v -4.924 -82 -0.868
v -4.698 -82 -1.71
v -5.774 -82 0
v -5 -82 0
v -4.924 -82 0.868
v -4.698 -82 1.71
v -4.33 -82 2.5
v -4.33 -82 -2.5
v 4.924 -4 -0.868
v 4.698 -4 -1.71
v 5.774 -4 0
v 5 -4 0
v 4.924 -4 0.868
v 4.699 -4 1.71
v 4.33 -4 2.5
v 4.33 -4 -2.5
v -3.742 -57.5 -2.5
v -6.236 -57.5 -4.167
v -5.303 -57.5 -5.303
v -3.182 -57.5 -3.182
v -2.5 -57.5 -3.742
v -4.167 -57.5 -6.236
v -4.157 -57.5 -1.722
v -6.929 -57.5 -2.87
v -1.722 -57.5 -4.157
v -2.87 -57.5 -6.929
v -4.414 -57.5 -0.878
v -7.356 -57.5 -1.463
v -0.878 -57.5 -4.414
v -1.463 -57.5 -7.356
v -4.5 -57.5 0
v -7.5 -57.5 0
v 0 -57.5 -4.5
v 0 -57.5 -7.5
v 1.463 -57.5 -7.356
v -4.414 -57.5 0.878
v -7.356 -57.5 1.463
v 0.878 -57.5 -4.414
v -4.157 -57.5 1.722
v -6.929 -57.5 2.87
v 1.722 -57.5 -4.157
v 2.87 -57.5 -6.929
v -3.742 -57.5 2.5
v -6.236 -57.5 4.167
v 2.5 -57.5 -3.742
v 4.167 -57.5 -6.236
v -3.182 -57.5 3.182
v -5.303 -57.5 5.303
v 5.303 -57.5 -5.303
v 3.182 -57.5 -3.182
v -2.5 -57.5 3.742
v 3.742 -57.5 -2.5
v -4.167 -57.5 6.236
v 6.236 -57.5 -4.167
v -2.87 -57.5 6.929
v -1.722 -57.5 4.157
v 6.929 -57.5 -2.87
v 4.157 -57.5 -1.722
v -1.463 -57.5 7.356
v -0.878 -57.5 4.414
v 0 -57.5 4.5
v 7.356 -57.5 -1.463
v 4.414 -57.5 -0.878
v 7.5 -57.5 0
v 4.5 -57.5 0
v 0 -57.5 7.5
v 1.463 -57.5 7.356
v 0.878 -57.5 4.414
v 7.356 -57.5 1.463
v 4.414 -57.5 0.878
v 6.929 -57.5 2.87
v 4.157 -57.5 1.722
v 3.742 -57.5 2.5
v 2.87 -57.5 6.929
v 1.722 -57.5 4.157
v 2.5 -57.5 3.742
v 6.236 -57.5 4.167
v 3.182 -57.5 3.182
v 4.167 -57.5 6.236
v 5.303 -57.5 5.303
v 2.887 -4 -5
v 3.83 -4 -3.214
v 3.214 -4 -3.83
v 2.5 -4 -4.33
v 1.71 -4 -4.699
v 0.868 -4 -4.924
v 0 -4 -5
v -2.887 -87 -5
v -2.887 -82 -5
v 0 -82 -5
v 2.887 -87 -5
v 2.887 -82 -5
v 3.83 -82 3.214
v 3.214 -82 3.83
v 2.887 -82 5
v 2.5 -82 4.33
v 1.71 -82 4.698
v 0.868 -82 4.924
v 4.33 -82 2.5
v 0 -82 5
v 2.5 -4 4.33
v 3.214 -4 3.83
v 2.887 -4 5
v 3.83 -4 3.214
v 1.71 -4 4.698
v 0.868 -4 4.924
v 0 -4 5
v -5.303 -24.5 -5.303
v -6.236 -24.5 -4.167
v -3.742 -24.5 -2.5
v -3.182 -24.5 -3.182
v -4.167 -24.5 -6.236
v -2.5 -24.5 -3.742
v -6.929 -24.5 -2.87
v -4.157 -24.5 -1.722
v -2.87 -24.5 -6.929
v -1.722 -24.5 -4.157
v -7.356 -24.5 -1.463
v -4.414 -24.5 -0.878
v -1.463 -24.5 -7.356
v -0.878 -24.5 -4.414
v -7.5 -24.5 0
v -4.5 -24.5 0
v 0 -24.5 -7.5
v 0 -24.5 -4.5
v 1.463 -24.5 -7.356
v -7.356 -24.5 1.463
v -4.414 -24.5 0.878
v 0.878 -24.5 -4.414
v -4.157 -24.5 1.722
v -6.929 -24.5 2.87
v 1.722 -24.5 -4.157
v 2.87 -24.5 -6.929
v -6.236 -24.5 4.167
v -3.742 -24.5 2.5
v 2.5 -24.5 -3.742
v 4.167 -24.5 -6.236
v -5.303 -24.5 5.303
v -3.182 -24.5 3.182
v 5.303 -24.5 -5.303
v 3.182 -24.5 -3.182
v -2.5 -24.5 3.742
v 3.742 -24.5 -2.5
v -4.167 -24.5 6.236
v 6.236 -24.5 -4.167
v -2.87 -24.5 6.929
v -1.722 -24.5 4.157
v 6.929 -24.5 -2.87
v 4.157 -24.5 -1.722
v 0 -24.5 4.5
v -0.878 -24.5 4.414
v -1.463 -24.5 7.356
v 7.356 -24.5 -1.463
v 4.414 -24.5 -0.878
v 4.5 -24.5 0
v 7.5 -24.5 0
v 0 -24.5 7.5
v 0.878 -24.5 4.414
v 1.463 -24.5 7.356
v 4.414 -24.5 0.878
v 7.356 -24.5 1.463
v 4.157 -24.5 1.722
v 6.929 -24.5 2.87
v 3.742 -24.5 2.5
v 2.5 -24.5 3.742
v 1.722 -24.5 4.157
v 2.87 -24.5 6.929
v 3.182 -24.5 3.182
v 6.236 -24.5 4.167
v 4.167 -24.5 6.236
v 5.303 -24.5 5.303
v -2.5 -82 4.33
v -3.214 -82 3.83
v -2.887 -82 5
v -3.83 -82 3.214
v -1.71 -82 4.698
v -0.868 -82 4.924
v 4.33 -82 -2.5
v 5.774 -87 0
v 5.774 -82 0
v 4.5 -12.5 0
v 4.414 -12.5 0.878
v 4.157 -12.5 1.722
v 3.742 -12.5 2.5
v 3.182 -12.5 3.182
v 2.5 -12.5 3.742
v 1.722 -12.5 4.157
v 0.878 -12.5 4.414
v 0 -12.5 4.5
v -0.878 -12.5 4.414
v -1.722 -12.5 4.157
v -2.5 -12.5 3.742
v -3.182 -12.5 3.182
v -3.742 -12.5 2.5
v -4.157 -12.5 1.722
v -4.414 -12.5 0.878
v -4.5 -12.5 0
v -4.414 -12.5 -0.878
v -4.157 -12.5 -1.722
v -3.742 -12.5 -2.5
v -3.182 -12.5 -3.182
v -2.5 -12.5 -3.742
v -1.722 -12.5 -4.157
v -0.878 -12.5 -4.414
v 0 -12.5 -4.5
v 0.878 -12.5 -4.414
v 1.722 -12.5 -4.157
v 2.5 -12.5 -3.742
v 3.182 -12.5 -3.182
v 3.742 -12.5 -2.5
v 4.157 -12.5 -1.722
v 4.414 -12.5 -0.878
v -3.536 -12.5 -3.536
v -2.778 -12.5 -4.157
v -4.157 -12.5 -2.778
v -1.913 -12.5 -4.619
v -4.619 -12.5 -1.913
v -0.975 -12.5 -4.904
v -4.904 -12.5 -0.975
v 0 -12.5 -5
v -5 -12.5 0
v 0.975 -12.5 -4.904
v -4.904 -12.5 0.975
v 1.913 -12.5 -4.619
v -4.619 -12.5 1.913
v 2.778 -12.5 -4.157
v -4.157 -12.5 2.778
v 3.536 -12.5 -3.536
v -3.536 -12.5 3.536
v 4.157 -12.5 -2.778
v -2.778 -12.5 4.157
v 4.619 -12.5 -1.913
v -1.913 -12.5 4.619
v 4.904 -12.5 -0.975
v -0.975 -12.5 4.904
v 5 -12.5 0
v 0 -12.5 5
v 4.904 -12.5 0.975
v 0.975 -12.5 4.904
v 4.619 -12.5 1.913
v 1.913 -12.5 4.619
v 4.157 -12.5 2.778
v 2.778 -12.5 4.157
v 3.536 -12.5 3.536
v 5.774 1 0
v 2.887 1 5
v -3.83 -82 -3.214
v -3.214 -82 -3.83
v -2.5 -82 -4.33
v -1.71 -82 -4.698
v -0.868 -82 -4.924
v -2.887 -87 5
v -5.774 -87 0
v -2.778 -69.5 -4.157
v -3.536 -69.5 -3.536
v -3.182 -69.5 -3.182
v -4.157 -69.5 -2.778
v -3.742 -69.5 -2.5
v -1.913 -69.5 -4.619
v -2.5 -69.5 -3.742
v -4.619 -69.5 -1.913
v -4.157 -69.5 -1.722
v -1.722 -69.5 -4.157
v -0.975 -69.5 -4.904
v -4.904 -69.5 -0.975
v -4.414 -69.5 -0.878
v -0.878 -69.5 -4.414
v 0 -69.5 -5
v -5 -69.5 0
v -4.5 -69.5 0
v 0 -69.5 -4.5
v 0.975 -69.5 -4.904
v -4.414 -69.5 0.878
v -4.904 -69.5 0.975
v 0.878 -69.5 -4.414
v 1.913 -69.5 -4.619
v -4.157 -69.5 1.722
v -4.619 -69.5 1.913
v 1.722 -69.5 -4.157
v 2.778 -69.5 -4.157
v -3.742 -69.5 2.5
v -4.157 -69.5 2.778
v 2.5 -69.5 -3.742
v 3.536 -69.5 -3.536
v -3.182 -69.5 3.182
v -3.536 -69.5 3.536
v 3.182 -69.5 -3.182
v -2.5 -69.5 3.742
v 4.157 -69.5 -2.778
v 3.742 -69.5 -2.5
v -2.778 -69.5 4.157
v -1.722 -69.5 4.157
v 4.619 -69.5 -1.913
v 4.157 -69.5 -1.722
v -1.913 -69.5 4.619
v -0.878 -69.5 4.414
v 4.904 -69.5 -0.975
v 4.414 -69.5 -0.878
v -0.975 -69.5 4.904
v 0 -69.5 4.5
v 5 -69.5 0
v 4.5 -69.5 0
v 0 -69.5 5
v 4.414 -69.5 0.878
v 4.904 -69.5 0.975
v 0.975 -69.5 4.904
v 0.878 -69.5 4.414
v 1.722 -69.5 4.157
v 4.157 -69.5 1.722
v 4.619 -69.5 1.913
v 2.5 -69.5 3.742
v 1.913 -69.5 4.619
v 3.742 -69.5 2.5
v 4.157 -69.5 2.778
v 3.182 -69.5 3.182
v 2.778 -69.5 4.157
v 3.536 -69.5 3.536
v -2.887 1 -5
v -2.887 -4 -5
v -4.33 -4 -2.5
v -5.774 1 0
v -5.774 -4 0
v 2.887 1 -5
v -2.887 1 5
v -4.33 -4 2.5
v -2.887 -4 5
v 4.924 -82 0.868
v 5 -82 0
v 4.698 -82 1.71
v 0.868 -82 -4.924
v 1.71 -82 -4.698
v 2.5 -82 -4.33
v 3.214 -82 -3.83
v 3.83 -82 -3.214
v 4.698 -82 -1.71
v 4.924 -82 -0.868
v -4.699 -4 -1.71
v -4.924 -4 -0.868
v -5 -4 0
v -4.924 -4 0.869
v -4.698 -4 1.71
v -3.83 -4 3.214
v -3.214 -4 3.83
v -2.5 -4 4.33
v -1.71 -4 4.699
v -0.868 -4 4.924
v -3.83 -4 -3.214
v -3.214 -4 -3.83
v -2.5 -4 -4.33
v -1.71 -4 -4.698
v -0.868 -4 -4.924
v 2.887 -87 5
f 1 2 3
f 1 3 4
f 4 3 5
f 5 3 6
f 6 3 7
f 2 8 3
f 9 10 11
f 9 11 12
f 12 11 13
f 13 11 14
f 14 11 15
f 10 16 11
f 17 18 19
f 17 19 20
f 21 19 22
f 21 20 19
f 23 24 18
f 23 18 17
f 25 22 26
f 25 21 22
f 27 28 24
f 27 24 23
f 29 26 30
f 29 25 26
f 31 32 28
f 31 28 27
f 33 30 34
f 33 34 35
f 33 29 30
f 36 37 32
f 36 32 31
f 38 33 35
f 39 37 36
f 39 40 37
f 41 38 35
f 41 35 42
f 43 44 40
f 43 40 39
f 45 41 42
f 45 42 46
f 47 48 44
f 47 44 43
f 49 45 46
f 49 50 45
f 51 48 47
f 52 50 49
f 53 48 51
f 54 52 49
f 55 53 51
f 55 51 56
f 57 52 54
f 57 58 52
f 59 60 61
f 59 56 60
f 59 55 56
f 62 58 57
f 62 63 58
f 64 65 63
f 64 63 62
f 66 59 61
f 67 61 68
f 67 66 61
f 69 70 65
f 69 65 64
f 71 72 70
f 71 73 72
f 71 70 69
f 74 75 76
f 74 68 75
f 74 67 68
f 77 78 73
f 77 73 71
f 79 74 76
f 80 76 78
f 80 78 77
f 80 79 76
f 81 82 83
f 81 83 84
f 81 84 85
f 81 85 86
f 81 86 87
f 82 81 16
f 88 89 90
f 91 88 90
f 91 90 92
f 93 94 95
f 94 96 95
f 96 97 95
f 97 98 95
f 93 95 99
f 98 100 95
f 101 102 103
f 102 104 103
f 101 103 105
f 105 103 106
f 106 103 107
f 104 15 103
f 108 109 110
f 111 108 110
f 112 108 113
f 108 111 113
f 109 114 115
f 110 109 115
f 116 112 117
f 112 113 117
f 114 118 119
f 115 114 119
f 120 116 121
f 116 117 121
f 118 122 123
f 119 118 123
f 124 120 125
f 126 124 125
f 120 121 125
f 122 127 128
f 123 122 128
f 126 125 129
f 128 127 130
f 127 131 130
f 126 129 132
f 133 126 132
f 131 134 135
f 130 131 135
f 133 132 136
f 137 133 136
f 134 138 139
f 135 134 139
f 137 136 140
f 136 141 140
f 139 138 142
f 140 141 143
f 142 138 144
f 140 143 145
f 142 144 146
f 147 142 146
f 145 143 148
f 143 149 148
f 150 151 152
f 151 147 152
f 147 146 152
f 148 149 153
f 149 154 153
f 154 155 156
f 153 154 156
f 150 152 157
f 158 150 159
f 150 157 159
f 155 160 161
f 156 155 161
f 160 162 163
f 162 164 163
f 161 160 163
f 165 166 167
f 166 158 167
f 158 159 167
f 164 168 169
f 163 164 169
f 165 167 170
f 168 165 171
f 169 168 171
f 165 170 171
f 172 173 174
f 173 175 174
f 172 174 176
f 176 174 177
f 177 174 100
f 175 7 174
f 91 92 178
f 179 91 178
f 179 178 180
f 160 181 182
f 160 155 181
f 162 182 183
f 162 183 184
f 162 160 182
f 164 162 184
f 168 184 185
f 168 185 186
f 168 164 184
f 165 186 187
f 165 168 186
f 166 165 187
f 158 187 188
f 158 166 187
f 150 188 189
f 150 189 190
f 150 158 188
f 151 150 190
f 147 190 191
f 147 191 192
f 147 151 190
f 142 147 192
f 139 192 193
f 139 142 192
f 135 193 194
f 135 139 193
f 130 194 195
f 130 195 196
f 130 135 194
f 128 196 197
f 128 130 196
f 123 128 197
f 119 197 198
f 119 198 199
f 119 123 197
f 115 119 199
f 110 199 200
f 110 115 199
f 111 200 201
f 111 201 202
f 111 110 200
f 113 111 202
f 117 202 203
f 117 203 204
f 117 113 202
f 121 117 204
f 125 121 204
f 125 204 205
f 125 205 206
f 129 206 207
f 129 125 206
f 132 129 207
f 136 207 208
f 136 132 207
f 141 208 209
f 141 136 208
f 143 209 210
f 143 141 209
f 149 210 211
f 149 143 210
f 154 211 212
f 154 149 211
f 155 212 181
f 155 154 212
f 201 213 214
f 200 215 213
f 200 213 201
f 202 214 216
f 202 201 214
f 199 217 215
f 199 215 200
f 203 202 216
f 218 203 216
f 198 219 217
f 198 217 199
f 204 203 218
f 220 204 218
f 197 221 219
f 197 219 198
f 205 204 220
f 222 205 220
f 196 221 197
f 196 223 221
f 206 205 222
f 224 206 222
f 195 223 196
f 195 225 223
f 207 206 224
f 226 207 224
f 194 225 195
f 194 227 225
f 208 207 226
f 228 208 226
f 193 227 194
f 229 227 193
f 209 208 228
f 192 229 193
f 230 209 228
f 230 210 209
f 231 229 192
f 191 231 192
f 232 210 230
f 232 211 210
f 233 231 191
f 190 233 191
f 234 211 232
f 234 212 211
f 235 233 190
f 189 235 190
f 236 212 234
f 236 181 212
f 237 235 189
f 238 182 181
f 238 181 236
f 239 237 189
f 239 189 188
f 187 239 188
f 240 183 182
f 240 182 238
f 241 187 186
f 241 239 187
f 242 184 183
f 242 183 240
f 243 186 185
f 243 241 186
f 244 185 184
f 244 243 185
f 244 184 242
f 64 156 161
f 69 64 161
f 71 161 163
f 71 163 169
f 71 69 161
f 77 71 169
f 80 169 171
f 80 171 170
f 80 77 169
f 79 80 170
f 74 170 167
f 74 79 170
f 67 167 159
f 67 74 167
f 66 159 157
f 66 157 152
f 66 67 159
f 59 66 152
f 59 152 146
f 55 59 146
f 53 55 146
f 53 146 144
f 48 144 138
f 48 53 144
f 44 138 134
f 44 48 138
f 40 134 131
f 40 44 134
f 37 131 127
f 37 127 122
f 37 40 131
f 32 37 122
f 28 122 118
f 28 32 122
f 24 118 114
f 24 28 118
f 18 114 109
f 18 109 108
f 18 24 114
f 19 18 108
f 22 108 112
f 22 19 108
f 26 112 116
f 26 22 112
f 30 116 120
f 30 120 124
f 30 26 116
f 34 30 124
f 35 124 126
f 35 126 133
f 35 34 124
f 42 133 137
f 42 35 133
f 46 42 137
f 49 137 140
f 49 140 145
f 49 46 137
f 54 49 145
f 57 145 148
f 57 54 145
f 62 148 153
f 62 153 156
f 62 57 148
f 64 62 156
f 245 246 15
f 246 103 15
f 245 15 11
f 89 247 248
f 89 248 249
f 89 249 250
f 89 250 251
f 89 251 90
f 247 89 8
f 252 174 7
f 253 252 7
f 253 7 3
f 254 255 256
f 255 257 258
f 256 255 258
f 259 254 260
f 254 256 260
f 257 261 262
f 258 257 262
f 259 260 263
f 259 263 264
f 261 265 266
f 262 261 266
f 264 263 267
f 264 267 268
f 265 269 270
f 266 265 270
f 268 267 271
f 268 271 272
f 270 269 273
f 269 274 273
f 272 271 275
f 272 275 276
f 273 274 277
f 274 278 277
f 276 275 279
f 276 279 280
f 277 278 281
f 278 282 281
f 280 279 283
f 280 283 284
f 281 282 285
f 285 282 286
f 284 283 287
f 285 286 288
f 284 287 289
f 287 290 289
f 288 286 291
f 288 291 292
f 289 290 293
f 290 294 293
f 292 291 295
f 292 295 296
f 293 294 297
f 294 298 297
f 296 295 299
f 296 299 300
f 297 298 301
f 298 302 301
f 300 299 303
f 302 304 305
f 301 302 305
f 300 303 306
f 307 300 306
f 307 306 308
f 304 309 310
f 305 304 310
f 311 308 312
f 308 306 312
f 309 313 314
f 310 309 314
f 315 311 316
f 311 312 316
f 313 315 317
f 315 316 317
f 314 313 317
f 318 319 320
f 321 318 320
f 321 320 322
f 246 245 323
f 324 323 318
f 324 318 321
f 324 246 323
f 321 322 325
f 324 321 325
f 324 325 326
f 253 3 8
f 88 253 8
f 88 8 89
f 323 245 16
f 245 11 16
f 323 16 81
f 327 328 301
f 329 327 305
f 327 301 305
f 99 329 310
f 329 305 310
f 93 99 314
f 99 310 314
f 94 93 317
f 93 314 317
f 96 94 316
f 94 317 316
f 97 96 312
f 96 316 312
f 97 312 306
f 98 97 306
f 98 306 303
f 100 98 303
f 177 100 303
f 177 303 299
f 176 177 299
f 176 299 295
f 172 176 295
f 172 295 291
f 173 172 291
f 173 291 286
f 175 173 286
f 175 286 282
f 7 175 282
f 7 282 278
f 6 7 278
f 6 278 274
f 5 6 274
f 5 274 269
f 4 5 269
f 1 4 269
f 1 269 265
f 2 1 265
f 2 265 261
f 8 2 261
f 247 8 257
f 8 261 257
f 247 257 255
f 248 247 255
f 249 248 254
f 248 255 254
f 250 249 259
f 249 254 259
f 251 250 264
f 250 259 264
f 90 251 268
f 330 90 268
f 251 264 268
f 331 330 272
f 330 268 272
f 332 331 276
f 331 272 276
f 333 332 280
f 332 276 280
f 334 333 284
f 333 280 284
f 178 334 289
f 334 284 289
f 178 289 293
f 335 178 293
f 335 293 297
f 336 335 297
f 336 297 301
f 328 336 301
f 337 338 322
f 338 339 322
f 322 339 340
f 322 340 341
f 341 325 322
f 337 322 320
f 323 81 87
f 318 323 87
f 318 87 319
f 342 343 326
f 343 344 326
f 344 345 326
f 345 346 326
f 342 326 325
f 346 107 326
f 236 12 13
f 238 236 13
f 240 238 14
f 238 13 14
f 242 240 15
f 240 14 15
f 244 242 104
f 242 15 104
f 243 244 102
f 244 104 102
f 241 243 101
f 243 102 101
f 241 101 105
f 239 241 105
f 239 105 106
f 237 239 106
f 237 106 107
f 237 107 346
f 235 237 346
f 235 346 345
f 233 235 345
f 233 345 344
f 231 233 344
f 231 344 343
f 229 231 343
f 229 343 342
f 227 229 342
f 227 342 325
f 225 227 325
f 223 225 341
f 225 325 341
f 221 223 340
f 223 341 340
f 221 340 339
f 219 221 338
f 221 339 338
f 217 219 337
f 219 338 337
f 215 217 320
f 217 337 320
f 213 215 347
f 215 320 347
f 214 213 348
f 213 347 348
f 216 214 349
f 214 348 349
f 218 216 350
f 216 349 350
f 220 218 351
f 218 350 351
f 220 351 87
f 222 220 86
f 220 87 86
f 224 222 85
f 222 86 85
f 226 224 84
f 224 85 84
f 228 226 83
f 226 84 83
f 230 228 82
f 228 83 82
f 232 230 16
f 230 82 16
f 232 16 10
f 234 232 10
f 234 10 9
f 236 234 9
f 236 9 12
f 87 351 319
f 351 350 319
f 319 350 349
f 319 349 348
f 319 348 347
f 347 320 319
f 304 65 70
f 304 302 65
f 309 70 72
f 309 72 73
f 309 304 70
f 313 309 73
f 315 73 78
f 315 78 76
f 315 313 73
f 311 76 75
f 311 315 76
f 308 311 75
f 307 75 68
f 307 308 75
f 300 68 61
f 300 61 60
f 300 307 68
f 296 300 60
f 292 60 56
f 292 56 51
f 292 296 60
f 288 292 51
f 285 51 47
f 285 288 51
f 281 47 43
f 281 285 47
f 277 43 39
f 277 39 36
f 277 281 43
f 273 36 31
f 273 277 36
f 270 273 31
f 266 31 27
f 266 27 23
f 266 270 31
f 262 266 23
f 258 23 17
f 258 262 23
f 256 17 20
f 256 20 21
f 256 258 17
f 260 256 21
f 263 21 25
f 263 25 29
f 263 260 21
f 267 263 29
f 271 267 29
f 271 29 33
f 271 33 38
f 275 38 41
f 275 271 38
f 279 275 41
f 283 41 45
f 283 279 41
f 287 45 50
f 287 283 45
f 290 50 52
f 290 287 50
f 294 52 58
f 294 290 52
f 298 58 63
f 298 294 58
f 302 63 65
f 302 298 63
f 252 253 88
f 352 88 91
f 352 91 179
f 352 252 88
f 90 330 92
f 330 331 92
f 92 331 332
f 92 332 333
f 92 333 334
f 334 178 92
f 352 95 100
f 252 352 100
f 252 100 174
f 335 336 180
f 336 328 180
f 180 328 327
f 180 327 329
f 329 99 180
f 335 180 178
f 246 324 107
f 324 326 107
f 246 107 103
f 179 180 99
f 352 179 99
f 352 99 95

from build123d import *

# Parameters (mm, degrees)
F0_R           = 5
F1_DEPTH       = 82
F4_DEPTH       = 4
F6_R           = 5.5
F6_R_2         = 4.5
F7_DEPTH       = 11
F7_DEPTH_BACK  = 1
F9_R           = 5.5
F9_R_2         = 4.5
F10_DEPTH      = 11
F10_DEPTH_BACK = 1
F11_DEPTH      = 5
F13_R          = 7.5
F14_DEPTH      = 16.5
F14_DEPTH_BACK = 16.5
F16_DEPTH      = 1


with BuildPart() as f1:
    # F0 (on Front) → F1 (new body)
    with BuildSketch(Plane.XZ):
        Circle(F0_R)
    extrude(amount=F1_DEPTH)

    # F3 (on face) → F4 (join)
    with BuildSketch(Plane(origin=(0, 0, 0), x_dir=(-1, 0, 0), z_dir=(0, 1, 0))):
        Polygon((2.886751, 5), (-2.886751, 5), (-5.773503, 0), (-2.886751, -5), (2.886751, -5), (5.773503, 0), align=None)
    extrude(amount=-F4_DEPTH)

    # F6 (on offset) → F7 (cut, two sides)
    with BuildSketch(Plane.XZ.offset(13.5)) as f7_sk:
        Circle(F6_R)
        Circle(F6_R_2, mode=Mode.SUBTRACT)
    extrude(amount=F7_DEPTH, mode=Mode.SUBTRACT)
    extrude(f7_sk.sketch, amount=-F7_DEPTH_BACK, mode=Mode.SUBTRACT)

    # F9 (on offset) → F10 (cut, two sides)
    with BuildSketch(Plane.XZ.offset(58.5)) as f10_sk:
        Circle(F9_R)
        Circle(F9_R_2, mode=Mode.SUBTRACT)
    extrude(amount=F10_DEPTH, mode=Mode.SUBTRACT)
    extrude(f10_sk.sketch, amount=-F10_DEPTH_BACK, mode=Mode.SUBTRACT)

    # F2 (on face) → F11 (join)
    with BuildSketch(Plane.XZ.offset(82)):
        Polygon((2.886751, 5), (-2.886751, 5), (-5.773503, 0), (-2.886751, -5), (2.886751, -5), (5.773503, 0), align=None)
    extrude(amount=F11_DEPTH)

    # F13 (on offset) → F14 (join, two sides)
    with BuildSketch(Plane.XZ.offset(41)) as f14_sk:
        Circle(F13_R)
    extrude(amount=F14_DEPTH)
    extrude(f14_sk.sketch, amount=-F14_DEPTH_BACK)

    # F15 (on face) → F16 (join)
    with BuildSketch(Plane(origin=(0, 0, 0), x_dir=(-1, 0, 0), z_dir=(0, 1, 0))):
        Polygon((5.773503, 0), (2.886751, 5), (-2.886751, 5), (-5.773503, 0), (-2.886751, -5), (2.886751, -5), align=None)
    extrude(amount=F16_DEPTH)


solid = f1.part
